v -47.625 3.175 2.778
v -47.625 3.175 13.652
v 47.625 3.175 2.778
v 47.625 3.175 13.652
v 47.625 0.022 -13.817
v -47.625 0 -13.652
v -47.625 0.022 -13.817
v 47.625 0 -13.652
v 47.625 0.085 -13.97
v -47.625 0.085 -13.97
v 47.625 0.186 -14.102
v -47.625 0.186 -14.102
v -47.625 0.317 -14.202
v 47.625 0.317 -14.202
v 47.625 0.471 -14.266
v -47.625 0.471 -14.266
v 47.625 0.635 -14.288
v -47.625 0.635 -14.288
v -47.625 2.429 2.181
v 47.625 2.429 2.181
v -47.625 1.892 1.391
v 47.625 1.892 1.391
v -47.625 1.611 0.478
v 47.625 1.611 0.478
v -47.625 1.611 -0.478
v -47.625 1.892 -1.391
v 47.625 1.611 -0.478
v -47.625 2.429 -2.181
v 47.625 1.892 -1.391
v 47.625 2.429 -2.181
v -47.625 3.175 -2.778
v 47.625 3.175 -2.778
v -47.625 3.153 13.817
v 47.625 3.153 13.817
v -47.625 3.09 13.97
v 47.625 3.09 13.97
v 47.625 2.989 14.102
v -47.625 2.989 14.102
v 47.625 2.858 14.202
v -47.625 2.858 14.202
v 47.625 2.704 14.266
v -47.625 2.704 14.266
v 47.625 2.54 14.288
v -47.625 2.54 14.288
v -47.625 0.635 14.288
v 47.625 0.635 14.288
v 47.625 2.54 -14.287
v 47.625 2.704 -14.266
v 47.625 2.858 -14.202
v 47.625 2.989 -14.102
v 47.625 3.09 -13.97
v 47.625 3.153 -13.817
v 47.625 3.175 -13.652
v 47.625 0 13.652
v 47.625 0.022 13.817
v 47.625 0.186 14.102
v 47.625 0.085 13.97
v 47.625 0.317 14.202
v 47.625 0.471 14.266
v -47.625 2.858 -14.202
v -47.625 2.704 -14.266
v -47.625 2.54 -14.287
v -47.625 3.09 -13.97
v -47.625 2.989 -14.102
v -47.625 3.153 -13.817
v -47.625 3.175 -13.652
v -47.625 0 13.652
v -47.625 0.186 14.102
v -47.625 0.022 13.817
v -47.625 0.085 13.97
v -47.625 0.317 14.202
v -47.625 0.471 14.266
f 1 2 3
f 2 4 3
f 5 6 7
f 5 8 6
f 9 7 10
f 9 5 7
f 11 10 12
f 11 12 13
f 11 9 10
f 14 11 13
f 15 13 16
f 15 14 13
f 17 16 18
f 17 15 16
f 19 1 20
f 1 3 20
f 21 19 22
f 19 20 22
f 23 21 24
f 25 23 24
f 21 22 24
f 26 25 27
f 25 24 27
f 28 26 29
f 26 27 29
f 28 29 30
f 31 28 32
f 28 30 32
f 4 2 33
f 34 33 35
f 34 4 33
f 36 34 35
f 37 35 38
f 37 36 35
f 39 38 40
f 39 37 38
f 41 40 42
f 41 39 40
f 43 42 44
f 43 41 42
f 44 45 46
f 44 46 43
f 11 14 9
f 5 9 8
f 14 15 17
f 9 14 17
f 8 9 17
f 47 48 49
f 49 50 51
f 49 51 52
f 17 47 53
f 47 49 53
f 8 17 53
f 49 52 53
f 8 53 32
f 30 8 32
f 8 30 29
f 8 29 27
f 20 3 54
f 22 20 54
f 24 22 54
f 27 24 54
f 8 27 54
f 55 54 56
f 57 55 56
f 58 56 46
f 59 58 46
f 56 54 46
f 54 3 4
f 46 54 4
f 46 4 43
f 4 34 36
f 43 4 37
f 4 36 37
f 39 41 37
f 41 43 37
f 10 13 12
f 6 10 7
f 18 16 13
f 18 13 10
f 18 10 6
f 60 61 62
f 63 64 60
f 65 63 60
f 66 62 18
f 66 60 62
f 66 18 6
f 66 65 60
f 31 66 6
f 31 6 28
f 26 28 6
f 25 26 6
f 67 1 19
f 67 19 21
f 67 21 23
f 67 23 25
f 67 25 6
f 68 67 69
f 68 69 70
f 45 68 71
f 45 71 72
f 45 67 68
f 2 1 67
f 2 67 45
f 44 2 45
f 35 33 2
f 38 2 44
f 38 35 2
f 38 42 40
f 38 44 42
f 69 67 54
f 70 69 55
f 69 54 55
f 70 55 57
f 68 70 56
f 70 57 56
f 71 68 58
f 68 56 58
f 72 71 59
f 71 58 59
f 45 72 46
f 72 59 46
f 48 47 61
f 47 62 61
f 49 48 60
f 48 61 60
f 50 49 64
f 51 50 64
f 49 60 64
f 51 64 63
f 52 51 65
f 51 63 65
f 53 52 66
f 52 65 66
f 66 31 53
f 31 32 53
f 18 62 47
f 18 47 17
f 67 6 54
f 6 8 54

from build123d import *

# Parameters (mm, degrees)
EXTRUDE1_DEPTH = 47.625
FILLET1_R      = 0.635


with BuildPart() as part:
    # Sketch2 → Extrude1 (new, symmetric)
    with BuildSketch(Plane(origin=(0, 0, 0), x_dir=(0, 0, -1), z_dir=(1, 0, 0))):
        with BuildLine():
            Line((-14.2875, 3.175), (-2.778125, 3.175))
            ThreePointArc((-2.778125, 3.175), (0, 1.5748), (2.778125, 3.175))
            Line((2.778125, 3.175), (14.2875, 3.175))
            Line((14.2875, 3.175), (14.2875, 0))
            Line((14.2875, 0), (-14.2875, 0))
            Line((-14.2875, 0), (-14.2875, 3.175))
        make_face()
    extrude(amount=EXTRUDE1_DEPTH, both=True)

    # Fillet1
    fillet1_edges = [part.edges().sort_by_distance(p)[0] for p in [
        (0, 3.175, 14.2875),
        (0, 3.175, -14.2875),
        (0, 0, -14.2875),
        (0, 0, 14.2875),
    ]]
    fillet(fillet1_edges, radius=FILLET1_R)


solid = part.part
